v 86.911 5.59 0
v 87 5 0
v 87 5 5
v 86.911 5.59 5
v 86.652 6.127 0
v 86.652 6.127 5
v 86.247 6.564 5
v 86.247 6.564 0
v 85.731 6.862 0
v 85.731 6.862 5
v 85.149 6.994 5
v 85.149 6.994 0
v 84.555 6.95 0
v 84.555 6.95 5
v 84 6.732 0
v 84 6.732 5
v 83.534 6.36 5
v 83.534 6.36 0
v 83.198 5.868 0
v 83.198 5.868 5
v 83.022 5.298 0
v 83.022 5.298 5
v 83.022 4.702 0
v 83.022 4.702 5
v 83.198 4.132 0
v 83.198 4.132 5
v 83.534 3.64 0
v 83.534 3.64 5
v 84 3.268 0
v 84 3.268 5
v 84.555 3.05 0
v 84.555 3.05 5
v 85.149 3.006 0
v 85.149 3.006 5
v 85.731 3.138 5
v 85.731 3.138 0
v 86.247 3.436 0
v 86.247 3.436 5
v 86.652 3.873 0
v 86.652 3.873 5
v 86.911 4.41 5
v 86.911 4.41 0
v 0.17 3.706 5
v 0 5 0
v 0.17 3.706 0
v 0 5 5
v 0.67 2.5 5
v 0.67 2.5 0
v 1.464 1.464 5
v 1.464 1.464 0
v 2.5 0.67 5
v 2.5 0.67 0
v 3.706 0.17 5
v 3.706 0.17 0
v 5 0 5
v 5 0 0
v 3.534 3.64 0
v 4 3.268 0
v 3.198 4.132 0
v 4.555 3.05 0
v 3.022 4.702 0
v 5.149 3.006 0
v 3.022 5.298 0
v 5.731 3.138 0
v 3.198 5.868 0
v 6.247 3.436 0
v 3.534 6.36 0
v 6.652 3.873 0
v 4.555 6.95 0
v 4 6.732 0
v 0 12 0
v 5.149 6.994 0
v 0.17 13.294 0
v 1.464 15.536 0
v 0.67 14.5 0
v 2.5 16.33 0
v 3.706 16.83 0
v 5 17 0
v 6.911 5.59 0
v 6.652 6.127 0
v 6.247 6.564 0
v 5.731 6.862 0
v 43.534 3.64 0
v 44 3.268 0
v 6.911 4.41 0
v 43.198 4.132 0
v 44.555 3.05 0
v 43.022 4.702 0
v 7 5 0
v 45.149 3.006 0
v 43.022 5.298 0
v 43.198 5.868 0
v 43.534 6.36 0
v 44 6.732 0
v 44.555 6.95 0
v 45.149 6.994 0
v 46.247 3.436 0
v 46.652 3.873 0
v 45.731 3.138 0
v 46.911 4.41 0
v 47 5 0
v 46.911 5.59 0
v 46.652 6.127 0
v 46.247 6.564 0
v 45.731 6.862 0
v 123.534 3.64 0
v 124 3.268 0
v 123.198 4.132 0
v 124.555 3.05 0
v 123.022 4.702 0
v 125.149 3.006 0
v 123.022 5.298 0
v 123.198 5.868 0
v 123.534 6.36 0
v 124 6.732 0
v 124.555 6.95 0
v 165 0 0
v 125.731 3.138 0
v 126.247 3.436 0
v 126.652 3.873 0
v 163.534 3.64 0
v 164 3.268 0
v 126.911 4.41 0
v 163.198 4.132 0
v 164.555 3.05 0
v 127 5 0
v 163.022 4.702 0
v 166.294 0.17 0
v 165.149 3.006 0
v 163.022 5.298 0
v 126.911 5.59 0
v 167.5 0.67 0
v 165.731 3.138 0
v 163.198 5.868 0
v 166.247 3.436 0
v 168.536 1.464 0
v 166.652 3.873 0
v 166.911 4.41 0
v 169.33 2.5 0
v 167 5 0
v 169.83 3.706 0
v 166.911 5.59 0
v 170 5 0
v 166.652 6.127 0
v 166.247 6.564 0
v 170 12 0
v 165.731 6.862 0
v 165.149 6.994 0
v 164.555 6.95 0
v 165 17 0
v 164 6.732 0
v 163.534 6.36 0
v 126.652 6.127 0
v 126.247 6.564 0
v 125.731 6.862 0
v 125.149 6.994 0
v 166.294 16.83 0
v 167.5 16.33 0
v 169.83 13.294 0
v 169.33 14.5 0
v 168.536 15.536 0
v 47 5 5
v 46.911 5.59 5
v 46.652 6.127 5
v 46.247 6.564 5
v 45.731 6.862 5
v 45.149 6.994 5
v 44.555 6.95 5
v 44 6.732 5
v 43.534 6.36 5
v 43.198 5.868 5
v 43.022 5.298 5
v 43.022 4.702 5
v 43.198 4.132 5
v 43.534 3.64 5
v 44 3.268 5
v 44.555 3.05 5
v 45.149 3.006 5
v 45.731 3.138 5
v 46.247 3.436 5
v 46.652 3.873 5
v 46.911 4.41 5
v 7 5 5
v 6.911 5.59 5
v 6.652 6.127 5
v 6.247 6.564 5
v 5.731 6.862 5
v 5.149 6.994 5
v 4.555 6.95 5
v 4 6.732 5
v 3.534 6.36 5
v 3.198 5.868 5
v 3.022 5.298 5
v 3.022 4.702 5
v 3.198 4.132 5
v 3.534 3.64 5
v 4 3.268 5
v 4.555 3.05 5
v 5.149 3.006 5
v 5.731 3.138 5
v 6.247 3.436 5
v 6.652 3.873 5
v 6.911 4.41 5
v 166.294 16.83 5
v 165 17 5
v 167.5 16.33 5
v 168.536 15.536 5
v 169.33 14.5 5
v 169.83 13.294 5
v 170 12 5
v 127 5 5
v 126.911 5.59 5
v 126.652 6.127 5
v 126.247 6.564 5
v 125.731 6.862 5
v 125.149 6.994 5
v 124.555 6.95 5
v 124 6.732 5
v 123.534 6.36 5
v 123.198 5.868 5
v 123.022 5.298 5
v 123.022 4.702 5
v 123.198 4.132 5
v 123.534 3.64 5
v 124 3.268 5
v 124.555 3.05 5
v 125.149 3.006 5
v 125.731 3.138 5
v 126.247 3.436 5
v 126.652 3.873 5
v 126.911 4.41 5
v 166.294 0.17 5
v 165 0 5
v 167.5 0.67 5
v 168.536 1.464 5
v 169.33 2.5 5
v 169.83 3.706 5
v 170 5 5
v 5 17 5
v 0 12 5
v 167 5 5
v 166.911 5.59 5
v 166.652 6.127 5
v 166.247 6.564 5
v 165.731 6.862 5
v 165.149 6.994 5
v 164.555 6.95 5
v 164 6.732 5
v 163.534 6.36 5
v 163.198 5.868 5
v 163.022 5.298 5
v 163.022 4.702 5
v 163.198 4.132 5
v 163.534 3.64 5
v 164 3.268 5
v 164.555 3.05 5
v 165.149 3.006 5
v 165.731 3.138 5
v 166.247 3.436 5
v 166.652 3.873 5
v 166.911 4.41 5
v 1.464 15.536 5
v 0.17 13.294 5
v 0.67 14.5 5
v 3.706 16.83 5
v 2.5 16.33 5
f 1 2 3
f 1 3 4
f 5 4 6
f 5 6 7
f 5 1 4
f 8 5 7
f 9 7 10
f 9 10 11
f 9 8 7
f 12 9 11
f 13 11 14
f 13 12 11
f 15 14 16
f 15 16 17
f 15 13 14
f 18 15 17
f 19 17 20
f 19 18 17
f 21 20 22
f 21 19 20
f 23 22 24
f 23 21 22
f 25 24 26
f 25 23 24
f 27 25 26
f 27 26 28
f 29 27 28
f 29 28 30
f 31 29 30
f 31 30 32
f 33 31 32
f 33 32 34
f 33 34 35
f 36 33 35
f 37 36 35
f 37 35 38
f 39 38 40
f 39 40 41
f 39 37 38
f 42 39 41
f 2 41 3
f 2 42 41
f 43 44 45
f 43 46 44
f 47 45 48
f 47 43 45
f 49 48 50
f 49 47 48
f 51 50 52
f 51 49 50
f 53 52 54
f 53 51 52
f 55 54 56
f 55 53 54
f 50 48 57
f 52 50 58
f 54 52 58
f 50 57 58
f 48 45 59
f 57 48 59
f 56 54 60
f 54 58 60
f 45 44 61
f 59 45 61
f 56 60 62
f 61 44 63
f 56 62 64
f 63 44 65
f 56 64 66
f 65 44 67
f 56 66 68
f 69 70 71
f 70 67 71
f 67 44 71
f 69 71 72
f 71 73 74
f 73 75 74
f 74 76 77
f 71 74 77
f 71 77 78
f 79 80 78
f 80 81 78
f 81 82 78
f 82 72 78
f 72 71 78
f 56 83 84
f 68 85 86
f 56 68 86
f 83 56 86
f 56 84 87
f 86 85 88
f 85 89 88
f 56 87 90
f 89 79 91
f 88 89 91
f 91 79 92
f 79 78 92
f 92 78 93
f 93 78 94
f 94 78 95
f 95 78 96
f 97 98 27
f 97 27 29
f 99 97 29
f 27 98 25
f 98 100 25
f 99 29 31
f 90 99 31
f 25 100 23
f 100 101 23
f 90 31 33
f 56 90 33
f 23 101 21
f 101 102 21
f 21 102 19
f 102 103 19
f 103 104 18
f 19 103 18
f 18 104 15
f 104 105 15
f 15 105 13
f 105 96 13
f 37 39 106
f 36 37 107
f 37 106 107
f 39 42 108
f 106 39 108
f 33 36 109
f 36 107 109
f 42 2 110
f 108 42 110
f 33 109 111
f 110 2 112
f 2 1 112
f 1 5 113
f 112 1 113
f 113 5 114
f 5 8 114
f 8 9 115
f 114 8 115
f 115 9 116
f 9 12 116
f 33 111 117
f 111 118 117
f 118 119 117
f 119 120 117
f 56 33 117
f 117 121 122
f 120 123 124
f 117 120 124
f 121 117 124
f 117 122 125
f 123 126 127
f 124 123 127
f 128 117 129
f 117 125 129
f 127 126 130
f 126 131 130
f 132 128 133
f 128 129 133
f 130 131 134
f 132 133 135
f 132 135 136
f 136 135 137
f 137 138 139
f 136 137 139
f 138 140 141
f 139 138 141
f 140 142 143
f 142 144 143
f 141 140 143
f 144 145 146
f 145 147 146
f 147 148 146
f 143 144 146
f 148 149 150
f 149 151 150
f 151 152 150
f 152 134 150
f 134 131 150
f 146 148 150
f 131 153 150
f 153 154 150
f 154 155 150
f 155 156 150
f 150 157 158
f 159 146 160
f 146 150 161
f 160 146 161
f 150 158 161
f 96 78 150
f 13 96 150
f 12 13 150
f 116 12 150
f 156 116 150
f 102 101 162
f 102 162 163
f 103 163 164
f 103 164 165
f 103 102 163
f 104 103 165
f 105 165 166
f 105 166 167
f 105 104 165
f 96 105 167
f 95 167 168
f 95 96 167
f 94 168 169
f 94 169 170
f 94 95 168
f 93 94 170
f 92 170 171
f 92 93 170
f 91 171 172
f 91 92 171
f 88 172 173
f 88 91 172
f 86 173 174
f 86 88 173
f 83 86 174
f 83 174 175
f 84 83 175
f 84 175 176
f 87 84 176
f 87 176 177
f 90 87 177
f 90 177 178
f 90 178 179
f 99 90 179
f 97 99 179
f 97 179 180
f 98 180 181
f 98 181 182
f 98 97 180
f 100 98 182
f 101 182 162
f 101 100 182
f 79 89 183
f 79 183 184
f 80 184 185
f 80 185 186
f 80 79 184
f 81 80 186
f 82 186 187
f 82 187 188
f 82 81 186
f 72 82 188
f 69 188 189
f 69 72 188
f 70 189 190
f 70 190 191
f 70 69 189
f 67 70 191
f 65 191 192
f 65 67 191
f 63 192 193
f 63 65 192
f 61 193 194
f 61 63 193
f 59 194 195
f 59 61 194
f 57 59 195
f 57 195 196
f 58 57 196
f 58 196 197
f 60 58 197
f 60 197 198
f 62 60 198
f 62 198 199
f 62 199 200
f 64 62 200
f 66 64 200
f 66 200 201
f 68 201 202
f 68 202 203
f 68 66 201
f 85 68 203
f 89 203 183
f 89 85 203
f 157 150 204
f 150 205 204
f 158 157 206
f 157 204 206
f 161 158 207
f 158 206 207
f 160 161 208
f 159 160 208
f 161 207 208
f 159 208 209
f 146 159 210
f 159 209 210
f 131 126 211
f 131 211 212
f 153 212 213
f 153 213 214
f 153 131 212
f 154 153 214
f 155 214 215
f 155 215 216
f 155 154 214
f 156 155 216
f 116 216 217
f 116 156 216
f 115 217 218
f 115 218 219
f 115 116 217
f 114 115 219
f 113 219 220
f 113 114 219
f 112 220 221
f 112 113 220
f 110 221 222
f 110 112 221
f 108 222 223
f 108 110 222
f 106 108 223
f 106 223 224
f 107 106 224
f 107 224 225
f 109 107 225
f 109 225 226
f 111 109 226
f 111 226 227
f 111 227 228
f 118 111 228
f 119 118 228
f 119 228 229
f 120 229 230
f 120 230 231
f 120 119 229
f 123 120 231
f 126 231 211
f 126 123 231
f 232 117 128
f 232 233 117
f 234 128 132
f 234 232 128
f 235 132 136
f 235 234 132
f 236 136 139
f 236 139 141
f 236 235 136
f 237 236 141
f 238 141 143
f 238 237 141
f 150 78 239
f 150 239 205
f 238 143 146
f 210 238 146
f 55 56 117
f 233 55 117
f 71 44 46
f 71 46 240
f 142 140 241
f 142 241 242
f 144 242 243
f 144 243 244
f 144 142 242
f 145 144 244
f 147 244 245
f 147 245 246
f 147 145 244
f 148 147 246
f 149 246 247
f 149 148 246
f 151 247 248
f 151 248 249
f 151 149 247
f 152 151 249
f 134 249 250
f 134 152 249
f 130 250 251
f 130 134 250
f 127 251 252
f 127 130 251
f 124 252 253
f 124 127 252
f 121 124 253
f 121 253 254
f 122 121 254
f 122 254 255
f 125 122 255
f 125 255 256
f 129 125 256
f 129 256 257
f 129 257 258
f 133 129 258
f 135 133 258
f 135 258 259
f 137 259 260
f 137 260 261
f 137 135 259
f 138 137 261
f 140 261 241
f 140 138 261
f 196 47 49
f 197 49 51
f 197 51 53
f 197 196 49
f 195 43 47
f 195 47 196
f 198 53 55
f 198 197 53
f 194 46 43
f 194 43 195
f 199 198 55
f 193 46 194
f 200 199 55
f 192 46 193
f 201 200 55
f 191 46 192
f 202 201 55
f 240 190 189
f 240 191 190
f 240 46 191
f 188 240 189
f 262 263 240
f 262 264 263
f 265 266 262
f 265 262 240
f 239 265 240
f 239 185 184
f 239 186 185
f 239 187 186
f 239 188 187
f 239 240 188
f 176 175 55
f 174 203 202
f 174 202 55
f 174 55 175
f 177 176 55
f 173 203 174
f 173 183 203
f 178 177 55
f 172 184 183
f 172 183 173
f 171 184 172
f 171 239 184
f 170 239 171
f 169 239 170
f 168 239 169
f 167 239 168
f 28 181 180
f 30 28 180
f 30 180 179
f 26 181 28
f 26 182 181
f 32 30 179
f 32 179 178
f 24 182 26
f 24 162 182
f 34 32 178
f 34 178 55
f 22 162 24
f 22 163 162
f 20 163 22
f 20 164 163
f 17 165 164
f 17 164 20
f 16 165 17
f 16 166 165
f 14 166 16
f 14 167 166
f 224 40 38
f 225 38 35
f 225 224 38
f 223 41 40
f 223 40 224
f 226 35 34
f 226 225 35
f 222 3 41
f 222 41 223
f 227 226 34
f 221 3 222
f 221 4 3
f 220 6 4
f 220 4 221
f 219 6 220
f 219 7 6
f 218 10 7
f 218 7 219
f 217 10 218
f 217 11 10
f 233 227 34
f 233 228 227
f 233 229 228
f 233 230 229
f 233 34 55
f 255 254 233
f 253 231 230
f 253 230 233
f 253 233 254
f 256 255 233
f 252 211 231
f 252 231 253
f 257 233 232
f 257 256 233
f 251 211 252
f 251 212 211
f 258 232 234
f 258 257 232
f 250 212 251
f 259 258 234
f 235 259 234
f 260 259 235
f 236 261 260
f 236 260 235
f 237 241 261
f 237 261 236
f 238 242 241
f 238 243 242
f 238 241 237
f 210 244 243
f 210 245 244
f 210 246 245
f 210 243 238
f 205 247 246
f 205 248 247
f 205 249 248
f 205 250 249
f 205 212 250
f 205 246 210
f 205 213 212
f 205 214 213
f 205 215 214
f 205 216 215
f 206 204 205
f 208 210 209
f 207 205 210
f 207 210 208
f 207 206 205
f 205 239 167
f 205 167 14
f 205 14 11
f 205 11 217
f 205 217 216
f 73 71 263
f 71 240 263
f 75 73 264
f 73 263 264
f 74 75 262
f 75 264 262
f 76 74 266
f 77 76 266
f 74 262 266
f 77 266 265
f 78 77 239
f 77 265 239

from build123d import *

# Parameters (mm, degrees)
ESQUISSE1_W        = 170
ESQUISSE1_H        = 17
ESQUISSE1_R        = 2
BOSS_EXTRU_1_DEPTH = 5
CONG_1_R           = 5


with BuildPart() as part:
    # Esquisse1 → Boss.-Extru.1 (new body)
    with BuildSketch(Plane.XY):
        with Locations((85, 8.5)):
            Rectangle(ESQUISSE1_W, ESQUISSE1_H)
        with Locations((5, 5)):
            Circle(ESQUISSE1_R, mode=Mode.SUBTRACT)
        with Locations((45, 5)):
            Circle(ESQUISSE1_R, mode=Mode.SUBTRACT)
        with Locations((85, 5)):
            Circle(ESQUISSE1_R, mode=Mode.SUBTRACT)
        with Locations((125, 5)):
            Circle(ESQUISSE1_R, mode=Mode.SUBTRACT)
        with Locations((165, 5)):
            Circle(ESQUISSE1_R, mode=Mode.SUBTRACT)
    extrude(amount=BOSS_EXTRU_1_DEPTH)

    # Congé1
    cong_1_edges = [part.edges().sort_by_distance(p)[0] for p in [
        (0, 17, 2.5),
        (170, 17, 2.5),
        (170, 0, 2.5),
        (0, 0, 2.5),
    ]]
    fillet(cong_1_edges, radius=CONG_1_R)


solid = part.part
